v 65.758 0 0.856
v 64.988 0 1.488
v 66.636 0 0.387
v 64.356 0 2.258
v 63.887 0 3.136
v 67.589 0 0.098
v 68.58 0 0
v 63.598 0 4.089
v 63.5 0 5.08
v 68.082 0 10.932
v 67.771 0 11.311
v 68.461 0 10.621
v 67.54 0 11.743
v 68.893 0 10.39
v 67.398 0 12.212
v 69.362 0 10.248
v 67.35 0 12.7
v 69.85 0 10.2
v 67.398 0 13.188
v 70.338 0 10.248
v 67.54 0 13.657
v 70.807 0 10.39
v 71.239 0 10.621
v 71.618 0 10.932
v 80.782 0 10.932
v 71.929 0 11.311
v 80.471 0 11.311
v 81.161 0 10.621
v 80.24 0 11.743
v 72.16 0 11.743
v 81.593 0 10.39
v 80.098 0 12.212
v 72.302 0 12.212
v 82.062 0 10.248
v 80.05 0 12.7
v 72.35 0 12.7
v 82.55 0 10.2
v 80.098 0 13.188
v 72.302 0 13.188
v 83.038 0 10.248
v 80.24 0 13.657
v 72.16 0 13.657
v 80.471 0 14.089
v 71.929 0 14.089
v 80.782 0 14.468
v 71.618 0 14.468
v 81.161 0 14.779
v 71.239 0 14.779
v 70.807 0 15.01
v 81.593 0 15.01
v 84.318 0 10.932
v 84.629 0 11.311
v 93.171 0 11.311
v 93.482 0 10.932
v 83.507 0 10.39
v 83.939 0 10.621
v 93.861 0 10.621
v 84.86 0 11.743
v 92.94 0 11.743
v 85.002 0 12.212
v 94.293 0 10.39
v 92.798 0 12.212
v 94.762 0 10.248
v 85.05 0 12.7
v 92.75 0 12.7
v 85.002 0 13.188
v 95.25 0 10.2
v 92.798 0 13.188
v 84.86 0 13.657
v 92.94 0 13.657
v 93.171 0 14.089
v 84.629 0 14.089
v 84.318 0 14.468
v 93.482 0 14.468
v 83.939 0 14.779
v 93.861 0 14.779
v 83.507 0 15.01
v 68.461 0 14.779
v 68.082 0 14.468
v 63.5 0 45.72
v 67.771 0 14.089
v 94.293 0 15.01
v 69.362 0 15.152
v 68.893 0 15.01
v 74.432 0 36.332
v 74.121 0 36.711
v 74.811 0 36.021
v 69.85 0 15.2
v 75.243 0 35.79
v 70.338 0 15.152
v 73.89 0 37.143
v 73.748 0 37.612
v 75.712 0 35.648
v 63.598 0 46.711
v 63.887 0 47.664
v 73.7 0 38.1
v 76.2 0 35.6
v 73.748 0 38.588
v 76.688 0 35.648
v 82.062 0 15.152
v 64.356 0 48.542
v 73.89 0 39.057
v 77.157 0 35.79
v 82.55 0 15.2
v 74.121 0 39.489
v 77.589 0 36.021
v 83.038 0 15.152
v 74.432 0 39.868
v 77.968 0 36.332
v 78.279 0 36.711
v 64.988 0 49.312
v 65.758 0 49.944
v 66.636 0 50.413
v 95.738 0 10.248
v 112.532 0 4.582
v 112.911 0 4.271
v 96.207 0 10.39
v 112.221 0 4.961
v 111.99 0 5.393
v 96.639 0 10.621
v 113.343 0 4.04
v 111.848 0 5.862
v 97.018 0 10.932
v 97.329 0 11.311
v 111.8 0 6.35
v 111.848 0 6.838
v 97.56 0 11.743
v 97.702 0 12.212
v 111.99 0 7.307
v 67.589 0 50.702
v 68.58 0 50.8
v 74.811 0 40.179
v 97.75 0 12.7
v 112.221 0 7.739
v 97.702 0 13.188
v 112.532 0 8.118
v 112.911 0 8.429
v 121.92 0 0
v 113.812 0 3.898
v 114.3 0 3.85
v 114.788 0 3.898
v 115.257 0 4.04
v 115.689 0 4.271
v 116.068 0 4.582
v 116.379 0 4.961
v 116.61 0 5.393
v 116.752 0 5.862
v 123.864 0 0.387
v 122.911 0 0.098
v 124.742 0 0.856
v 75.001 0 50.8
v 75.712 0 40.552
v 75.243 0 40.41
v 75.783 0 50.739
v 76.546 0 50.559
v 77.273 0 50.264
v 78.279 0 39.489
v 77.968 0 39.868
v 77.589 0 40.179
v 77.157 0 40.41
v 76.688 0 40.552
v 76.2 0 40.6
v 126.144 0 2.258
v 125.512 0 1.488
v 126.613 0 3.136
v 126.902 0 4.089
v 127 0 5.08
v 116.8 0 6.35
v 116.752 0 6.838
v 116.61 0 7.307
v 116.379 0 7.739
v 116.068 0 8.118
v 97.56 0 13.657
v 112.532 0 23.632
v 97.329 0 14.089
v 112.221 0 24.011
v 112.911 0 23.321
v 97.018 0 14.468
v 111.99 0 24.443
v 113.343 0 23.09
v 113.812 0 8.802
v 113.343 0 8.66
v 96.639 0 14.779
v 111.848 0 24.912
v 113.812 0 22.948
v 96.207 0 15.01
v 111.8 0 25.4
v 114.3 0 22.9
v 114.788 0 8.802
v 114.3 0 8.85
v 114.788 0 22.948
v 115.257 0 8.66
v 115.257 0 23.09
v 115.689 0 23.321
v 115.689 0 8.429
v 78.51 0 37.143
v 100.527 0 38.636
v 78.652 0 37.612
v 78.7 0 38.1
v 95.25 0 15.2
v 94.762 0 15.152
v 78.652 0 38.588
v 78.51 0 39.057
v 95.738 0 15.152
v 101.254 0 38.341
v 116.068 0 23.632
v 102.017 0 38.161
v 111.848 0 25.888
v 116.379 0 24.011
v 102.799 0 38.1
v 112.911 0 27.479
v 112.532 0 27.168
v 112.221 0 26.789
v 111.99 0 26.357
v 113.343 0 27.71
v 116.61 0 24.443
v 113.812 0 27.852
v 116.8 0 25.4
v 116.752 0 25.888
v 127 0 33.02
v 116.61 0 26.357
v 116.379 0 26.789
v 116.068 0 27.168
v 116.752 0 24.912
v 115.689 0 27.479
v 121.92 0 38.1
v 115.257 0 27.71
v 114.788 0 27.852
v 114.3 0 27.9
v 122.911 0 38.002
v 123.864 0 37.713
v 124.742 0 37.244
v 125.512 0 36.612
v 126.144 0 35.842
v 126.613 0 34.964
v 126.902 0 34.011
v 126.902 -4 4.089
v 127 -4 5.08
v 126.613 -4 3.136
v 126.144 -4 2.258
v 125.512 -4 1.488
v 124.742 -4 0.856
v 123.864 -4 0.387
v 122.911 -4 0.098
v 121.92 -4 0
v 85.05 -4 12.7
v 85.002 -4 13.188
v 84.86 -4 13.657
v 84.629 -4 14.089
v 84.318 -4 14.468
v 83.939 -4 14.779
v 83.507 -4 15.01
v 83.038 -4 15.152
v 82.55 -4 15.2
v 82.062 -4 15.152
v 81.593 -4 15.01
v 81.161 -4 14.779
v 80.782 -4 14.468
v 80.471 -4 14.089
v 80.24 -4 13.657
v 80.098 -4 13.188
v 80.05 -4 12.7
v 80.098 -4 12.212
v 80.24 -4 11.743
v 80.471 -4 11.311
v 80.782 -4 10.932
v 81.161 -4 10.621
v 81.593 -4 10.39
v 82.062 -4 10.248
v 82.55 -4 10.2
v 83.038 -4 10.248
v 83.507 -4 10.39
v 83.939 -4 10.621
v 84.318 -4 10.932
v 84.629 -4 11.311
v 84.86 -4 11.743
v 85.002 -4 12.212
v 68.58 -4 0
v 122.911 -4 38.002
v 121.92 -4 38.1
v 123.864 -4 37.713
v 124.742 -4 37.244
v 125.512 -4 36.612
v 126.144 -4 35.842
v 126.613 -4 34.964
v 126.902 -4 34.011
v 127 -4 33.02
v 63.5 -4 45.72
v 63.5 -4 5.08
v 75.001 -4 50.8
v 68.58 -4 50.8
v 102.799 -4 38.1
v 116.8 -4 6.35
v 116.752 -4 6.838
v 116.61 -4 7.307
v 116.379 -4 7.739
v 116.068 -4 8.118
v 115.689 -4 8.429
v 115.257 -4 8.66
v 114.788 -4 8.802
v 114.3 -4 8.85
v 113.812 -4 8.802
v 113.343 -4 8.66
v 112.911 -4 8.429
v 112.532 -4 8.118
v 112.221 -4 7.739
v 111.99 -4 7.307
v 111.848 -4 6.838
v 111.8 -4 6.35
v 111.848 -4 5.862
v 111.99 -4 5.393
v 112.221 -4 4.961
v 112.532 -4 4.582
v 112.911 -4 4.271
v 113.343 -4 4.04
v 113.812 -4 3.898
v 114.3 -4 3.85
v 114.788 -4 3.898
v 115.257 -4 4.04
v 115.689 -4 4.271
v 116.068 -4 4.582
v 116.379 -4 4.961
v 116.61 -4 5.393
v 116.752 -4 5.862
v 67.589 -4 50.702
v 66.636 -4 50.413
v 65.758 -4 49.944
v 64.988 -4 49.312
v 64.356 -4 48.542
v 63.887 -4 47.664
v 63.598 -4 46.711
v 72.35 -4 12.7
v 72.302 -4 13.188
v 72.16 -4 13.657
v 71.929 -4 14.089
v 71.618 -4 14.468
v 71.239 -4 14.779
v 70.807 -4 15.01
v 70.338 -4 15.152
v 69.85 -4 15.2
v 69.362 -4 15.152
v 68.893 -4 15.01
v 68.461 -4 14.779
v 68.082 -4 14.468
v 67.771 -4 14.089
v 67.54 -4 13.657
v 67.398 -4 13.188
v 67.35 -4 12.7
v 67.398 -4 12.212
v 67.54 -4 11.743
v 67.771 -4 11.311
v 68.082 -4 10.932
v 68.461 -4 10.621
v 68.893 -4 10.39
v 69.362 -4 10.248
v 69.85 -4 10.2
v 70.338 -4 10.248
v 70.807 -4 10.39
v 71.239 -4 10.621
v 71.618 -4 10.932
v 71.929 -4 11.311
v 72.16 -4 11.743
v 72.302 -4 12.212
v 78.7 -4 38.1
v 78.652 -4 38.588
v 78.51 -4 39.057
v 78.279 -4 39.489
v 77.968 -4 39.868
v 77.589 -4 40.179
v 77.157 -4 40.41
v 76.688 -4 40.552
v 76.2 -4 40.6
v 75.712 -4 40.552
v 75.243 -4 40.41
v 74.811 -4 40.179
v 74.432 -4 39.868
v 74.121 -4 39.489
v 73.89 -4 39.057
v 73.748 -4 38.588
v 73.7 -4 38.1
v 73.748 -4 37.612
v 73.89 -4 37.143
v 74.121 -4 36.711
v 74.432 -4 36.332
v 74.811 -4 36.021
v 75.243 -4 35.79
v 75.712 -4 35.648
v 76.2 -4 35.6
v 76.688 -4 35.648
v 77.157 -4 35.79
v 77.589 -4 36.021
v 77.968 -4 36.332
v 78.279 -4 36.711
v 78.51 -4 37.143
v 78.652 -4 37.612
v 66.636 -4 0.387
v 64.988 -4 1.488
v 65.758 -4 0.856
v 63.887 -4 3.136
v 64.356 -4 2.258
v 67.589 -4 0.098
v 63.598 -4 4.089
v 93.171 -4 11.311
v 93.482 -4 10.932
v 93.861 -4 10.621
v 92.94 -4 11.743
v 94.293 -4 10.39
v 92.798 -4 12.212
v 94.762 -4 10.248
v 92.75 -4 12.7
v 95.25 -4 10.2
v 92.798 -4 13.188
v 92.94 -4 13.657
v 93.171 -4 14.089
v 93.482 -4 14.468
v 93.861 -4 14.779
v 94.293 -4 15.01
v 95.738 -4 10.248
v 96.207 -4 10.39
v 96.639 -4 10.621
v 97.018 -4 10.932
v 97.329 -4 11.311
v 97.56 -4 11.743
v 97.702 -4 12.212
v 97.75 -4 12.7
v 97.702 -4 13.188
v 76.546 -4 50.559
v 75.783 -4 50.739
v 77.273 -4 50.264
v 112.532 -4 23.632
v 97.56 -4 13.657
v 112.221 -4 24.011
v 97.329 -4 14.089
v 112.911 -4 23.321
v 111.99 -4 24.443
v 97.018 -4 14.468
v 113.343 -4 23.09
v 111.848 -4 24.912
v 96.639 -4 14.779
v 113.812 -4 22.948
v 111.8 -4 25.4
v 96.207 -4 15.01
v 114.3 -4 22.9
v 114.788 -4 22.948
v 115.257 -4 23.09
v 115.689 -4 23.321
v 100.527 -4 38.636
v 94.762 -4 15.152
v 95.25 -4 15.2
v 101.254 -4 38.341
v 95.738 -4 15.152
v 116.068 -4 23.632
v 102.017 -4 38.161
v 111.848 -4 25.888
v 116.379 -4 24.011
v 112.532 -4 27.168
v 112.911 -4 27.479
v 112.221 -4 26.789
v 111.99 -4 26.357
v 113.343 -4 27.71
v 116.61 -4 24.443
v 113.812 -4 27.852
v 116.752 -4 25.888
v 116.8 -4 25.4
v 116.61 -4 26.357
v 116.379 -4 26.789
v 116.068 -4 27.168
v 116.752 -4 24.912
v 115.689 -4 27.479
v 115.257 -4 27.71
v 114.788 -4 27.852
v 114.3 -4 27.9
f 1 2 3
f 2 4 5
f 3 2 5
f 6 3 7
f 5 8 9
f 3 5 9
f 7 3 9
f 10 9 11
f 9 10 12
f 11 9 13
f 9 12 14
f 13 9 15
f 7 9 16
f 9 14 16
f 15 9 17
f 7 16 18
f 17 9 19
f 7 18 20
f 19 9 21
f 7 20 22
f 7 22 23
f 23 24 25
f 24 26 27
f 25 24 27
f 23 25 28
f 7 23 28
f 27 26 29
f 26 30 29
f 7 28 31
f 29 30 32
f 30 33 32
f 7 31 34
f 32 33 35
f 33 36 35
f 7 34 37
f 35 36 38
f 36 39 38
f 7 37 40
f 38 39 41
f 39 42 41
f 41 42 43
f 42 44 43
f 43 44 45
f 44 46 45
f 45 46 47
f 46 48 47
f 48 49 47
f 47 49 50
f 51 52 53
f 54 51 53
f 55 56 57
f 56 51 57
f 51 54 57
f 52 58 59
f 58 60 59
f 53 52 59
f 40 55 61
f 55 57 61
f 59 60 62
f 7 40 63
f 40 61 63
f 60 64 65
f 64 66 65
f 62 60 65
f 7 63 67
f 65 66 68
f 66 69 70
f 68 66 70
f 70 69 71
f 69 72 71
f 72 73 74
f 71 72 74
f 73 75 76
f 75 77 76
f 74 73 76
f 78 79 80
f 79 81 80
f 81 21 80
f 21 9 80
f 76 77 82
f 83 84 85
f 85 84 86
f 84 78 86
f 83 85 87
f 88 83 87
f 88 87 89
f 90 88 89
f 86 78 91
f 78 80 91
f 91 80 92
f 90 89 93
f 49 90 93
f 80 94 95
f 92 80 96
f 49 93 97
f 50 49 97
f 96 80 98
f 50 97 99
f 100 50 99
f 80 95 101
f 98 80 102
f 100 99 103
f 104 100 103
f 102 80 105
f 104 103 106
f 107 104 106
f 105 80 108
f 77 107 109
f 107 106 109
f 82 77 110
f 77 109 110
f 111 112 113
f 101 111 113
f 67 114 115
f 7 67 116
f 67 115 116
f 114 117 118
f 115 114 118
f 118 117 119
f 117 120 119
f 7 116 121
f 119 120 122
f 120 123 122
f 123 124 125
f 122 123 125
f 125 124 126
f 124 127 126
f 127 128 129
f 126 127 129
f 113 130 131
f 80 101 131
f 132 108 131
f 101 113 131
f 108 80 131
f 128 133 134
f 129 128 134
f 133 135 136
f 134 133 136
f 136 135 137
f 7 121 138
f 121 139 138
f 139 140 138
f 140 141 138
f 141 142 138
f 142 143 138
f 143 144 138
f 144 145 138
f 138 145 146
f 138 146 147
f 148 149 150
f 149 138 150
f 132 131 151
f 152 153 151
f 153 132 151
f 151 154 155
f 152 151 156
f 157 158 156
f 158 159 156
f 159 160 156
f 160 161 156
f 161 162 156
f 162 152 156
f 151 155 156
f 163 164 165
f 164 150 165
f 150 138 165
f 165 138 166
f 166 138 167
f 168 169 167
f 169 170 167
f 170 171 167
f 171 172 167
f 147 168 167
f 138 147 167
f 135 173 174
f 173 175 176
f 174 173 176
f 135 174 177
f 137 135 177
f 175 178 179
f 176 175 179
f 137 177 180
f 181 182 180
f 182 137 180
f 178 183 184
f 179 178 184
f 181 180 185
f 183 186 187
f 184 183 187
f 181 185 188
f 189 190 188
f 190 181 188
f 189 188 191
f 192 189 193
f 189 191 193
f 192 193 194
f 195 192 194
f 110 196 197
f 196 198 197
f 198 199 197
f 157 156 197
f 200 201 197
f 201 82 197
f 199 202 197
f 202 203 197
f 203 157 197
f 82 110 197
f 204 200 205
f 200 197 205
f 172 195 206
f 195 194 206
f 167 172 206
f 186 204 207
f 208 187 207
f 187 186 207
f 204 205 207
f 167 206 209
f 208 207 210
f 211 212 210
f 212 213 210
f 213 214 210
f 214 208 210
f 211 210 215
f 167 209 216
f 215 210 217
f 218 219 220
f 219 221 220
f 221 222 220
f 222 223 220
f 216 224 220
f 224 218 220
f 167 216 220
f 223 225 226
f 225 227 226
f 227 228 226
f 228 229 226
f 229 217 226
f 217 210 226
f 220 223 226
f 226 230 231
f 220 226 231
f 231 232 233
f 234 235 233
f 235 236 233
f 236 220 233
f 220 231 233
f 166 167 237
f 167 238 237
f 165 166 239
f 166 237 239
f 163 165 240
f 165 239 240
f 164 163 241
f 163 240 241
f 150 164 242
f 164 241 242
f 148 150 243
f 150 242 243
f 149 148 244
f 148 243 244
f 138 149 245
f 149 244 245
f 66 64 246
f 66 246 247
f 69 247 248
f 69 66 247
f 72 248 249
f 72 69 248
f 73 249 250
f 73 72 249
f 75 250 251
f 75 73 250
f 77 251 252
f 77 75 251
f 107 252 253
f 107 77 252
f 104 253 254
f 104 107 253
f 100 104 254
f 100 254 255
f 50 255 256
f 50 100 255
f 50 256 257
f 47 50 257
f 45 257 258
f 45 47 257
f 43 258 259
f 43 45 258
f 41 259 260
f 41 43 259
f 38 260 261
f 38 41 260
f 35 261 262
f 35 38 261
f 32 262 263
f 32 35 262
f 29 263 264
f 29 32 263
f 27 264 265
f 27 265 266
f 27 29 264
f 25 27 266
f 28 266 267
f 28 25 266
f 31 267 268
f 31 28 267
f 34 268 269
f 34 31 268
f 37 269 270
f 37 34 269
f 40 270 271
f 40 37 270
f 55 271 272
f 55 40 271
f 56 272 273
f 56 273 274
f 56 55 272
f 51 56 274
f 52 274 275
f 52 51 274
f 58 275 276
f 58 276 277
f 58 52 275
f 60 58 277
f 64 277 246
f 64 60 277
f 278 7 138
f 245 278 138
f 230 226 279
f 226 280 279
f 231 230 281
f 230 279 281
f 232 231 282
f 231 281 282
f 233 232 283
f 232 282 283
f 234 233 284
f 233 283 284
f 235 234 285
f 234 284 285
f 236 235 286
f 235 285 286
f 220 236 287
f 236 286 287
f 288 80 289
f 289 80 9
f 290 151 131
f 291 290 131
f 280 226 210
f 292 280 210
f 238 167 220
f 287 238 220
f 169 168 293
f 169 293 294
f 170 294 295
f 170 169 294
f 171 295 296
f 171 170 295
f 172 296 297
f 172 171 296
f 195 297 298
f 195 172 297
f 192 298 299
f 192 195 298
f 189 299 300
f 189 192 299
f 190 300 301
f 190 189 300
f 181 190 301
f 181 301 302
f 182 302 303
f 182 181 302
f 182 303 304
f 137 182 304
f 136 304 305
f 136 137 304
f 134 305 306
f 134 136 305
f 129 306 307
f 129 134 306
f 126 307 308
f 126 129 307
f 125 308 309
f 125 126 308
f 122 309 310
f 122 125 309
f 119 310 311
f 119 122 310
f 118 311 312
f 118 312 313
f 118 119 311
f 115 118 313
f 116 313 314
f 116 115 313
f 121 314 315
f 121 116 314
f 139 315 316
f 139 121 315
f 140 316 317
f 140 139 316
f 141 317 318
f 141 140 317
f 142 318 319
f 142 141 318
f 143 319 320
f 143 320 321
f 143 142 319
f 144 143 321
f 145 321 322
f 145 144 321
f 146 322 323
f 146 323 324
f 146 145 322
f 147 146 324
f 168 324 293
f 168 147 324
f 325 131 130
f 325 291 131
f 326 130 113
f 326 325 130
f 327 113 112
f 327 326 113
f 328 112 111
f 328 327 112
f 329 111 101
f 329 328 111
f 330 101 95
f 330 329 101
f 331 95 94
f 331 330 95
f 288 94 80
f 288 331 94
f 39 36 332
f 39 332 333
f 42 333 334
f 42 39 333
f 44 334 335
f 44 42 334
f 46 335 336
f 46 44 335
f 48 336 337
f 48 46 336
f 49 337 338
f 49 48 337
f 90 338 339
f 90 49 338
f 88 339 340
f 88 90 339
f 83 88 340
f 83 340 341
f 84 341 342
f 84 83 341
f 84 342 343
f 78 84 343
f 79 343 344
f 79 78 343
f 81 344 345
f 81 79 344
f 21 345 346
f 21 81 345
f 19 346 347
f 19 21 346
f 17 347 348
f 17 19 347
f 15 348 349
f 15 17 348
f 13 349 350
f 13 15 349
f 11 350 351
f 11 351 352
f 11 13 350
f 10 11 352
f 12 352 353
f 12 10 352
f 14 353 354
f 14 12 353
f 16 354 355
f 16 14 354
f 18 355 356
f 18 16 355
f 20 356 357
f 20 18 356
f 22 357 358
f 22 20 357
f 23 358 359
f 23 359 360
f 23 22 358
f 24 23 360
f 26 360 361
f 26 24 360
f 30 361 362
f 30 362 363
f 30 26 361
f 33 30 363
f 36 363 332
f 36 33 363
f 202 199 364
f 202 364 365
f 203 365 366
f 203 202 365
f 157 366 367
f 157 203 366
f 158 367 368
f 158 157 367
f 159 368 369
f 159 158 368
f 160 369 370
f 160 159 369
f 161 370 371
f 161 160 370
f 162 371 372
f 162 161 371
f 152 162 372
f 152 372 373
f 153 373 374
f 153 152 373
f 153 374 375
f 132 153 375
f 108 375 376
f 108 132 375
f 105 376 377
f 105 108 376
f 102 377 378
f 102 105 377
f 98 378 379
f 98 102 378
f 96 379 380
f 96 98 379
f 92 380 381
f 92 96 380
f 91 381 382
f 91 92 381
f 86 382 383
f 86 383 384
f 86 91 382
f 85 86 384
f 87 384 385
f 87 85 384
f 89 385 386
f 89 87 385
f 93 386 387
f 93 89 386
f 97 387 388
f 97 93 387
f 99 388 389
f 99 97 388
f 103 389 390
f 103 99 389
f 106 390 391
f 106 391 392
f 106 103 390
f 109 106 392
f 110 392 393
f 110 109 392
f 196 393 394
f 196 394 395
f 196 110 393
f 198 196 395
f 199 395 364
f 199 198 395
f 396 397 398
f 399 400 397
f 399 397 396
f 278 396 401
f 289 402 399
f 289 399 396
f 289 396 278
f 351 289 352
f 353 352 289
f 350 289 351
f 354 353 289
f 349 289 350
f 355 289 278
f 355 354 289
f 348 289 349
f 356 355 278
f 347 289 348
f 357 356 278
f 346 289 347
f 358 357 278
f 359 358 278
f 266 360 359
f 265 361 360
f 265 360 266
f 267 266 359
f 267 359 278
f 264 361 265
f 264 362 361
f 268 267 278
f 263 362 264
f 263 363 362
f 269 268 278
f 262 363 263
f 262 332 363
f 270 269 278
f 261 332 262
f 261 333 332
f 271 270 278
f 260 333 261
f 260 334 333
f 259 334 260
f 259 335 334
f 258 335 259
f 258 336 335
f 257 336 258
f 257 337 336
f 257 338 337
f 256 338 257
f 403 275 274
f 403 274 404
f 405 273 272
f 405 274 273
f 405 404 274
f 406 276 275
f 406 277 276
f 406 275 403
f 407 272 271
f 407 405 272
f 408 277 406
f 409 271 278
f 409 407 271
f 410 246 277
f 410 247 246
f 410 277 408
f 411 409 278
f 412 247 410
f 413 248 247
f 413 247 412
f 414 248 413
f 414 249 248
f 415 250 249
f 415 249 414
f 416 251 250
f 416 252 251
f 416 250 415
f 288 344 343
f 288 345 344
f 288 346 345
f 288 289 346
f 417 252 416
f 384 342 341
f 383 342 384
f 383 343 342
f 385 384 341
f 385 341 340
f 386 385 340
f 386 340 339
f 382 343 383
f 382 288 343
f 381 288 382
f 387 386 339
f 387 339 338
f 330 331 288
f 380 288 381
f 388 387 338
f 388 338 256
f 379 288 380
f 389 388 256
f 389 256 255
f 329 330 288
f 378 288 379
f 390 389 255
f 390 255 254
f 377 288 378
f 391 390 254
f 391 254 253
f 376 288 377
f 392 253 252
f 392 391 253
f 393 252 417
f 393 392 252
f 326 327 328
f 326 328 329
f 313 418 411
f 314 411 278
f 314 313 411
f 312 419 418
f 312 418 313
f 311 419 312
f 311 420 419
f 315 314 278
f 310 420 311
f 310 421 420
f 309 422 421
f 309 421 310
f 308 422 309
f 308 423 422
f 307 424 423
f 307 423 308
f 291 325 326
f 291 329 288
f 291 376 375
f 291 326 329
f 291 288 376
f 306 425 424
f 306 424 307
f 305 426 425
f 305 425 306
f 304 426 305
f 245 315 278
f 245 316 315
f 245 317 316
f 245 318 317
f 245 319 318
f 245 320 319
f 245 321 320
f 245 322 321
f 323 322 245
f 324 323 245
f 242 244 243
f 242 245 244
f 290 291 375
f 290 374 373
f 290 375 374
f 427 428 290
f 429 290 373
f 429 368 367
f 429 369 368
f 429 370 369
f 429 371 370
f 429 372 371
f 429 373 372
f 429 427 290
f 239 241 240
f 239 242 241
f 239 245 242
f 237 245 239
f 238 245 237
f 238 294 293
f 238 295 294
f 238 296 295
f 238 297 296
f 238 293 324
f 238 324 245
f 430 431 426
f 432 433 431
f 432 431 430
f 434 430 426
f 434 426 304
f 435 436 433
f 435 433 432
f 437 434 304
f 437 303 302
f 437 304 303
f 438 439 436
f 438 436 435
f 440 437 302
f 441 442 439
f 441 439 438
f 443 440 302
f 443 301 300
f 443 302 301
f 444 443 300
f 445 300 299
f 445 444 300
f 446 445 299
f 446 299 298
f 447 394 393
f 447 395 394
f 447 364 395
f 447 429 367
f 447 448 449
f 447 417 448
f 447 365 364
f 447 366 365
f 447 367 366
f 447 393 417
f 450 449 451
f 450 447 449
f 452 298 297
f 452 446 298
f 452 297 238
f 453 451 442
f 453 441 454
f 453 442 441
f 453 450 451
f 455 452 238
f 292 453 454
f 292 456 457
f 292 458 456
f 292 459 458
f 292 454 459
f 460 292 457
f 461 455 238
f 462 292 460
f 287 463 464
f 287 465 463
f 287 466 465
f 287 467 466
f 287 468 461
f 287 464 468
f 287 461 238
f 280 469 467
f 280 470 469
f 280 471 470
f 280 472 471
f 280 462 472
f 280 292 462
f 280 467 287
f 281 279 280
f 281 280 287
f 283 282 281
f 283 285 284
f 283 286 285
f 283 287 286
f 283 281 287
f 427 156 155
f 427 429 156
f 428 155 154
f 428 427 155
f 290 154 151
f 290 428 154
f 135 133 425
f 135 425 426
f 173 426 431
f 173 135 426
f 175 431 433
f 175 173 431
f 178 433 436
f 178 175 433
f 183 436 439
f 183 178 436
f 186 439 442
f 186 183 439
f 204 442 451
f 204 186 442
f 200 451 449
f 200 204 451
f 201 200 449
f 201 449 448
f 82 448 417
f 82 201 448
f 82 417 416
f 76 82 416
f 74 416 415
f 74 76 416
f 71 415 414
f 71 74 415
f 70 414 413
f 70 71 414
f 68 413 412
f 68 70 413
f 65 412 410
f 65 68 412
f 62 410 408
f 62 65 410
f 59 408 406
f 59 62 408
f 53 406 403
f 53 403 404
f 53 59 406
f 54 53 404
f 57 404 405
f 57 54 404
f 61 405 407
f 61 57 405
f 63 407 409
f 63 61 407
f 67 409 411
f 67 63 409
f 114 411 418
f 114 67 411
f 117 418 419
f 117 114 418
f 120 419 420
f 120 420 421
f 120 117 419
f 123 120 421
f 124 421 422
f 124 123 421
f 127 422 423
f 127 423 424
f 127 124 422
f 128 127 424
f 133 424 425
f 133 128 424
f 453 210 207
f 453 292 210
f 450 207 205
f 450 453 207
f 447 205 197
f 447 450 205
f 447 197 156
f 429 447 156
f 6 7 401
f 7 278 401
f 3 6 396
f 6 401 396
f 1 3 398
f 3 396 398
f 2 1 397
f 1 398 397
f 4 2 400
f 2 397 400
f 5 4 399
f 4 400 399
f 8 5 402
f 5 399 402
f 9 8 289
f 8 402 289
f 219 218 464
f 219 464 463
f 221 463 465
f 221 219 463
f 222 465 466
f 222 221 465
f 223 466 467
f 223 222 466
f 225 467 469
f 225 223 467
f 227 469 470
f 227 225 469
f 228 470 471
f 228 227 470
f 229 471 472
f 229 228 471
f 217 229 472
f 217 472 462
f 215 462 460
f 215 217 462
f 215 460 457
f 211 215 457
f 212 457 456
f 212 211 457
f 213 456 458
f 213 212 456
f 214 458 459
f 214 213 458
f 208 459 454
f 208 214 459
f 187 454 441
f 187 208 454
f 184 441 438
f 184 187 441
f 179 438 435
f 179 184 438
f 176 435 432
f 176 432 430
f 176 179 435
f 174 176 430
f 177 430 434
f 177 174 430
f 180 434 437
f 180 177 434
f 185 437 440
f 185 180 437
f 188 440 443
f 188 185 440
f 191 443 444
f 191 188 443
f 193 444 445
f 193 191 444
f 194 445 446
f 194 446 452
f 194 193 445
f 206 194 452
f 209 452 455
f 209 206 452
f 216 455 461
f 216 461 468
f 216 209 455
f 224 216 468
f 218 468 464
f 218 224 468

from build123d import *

# Parameters (mm, degrees)
SKETCH1_R           = 2.5
BOSS_EXTRUDE1_DEPTH = 4
FILLET1_R           = 5.08


with BuildPart() as part:
    # Sketch1 → Boss-Extrude1 (new body)
    with BuildSketch(Plane.XZ):
        Polygon((127, 38.1), (101.6, 38.1), (76.2, 50.8), (63.5, 50.8), (63.5, 0), (127, 0), align=None)
        with Locations((69.85, 12.7)):
            Circle(SKETCH1_R, mode=Mode.SUBTRACT)
        with Locations((82.55, 12.7)):
            Circle(SKETCH1_R, mode=Mode.SUBTRACT)
        with Locations((114.3, 6.35)):
            Circle(SKETCH1_R, mode=Mode.SUBTRACT)
        with Locations((95.25, 12.7)):
            Circle(SKETCH1_R, mode=Mode.SUBTRACT)
        with Locations((114.3, 25.4)):
            Circle(SKETCH1_R, mode=Mode.SUBTRACT)
        with Locations((76.2, 38.1)):
            Circle(SKETCH1_R, mode=Mode.SUBTRACT)
    extrude(amount=BOSS_EXTRUDE1_DEPTH)

    # Fillet1
    fillet1_edges = [part.edges().sort_by_distance(p)[0] for p in [
        (63.5, -2, 50.8),
        (76.2, -2, 50.8),
        (101.6, -2, 38.1),
        (127, -2, 38.1),
        (127, -2, 0),
        (63.5, -2, 0),
    ]]
    fillet(fillet1_edges, radius=FILLET1_R)


solid = part.part
